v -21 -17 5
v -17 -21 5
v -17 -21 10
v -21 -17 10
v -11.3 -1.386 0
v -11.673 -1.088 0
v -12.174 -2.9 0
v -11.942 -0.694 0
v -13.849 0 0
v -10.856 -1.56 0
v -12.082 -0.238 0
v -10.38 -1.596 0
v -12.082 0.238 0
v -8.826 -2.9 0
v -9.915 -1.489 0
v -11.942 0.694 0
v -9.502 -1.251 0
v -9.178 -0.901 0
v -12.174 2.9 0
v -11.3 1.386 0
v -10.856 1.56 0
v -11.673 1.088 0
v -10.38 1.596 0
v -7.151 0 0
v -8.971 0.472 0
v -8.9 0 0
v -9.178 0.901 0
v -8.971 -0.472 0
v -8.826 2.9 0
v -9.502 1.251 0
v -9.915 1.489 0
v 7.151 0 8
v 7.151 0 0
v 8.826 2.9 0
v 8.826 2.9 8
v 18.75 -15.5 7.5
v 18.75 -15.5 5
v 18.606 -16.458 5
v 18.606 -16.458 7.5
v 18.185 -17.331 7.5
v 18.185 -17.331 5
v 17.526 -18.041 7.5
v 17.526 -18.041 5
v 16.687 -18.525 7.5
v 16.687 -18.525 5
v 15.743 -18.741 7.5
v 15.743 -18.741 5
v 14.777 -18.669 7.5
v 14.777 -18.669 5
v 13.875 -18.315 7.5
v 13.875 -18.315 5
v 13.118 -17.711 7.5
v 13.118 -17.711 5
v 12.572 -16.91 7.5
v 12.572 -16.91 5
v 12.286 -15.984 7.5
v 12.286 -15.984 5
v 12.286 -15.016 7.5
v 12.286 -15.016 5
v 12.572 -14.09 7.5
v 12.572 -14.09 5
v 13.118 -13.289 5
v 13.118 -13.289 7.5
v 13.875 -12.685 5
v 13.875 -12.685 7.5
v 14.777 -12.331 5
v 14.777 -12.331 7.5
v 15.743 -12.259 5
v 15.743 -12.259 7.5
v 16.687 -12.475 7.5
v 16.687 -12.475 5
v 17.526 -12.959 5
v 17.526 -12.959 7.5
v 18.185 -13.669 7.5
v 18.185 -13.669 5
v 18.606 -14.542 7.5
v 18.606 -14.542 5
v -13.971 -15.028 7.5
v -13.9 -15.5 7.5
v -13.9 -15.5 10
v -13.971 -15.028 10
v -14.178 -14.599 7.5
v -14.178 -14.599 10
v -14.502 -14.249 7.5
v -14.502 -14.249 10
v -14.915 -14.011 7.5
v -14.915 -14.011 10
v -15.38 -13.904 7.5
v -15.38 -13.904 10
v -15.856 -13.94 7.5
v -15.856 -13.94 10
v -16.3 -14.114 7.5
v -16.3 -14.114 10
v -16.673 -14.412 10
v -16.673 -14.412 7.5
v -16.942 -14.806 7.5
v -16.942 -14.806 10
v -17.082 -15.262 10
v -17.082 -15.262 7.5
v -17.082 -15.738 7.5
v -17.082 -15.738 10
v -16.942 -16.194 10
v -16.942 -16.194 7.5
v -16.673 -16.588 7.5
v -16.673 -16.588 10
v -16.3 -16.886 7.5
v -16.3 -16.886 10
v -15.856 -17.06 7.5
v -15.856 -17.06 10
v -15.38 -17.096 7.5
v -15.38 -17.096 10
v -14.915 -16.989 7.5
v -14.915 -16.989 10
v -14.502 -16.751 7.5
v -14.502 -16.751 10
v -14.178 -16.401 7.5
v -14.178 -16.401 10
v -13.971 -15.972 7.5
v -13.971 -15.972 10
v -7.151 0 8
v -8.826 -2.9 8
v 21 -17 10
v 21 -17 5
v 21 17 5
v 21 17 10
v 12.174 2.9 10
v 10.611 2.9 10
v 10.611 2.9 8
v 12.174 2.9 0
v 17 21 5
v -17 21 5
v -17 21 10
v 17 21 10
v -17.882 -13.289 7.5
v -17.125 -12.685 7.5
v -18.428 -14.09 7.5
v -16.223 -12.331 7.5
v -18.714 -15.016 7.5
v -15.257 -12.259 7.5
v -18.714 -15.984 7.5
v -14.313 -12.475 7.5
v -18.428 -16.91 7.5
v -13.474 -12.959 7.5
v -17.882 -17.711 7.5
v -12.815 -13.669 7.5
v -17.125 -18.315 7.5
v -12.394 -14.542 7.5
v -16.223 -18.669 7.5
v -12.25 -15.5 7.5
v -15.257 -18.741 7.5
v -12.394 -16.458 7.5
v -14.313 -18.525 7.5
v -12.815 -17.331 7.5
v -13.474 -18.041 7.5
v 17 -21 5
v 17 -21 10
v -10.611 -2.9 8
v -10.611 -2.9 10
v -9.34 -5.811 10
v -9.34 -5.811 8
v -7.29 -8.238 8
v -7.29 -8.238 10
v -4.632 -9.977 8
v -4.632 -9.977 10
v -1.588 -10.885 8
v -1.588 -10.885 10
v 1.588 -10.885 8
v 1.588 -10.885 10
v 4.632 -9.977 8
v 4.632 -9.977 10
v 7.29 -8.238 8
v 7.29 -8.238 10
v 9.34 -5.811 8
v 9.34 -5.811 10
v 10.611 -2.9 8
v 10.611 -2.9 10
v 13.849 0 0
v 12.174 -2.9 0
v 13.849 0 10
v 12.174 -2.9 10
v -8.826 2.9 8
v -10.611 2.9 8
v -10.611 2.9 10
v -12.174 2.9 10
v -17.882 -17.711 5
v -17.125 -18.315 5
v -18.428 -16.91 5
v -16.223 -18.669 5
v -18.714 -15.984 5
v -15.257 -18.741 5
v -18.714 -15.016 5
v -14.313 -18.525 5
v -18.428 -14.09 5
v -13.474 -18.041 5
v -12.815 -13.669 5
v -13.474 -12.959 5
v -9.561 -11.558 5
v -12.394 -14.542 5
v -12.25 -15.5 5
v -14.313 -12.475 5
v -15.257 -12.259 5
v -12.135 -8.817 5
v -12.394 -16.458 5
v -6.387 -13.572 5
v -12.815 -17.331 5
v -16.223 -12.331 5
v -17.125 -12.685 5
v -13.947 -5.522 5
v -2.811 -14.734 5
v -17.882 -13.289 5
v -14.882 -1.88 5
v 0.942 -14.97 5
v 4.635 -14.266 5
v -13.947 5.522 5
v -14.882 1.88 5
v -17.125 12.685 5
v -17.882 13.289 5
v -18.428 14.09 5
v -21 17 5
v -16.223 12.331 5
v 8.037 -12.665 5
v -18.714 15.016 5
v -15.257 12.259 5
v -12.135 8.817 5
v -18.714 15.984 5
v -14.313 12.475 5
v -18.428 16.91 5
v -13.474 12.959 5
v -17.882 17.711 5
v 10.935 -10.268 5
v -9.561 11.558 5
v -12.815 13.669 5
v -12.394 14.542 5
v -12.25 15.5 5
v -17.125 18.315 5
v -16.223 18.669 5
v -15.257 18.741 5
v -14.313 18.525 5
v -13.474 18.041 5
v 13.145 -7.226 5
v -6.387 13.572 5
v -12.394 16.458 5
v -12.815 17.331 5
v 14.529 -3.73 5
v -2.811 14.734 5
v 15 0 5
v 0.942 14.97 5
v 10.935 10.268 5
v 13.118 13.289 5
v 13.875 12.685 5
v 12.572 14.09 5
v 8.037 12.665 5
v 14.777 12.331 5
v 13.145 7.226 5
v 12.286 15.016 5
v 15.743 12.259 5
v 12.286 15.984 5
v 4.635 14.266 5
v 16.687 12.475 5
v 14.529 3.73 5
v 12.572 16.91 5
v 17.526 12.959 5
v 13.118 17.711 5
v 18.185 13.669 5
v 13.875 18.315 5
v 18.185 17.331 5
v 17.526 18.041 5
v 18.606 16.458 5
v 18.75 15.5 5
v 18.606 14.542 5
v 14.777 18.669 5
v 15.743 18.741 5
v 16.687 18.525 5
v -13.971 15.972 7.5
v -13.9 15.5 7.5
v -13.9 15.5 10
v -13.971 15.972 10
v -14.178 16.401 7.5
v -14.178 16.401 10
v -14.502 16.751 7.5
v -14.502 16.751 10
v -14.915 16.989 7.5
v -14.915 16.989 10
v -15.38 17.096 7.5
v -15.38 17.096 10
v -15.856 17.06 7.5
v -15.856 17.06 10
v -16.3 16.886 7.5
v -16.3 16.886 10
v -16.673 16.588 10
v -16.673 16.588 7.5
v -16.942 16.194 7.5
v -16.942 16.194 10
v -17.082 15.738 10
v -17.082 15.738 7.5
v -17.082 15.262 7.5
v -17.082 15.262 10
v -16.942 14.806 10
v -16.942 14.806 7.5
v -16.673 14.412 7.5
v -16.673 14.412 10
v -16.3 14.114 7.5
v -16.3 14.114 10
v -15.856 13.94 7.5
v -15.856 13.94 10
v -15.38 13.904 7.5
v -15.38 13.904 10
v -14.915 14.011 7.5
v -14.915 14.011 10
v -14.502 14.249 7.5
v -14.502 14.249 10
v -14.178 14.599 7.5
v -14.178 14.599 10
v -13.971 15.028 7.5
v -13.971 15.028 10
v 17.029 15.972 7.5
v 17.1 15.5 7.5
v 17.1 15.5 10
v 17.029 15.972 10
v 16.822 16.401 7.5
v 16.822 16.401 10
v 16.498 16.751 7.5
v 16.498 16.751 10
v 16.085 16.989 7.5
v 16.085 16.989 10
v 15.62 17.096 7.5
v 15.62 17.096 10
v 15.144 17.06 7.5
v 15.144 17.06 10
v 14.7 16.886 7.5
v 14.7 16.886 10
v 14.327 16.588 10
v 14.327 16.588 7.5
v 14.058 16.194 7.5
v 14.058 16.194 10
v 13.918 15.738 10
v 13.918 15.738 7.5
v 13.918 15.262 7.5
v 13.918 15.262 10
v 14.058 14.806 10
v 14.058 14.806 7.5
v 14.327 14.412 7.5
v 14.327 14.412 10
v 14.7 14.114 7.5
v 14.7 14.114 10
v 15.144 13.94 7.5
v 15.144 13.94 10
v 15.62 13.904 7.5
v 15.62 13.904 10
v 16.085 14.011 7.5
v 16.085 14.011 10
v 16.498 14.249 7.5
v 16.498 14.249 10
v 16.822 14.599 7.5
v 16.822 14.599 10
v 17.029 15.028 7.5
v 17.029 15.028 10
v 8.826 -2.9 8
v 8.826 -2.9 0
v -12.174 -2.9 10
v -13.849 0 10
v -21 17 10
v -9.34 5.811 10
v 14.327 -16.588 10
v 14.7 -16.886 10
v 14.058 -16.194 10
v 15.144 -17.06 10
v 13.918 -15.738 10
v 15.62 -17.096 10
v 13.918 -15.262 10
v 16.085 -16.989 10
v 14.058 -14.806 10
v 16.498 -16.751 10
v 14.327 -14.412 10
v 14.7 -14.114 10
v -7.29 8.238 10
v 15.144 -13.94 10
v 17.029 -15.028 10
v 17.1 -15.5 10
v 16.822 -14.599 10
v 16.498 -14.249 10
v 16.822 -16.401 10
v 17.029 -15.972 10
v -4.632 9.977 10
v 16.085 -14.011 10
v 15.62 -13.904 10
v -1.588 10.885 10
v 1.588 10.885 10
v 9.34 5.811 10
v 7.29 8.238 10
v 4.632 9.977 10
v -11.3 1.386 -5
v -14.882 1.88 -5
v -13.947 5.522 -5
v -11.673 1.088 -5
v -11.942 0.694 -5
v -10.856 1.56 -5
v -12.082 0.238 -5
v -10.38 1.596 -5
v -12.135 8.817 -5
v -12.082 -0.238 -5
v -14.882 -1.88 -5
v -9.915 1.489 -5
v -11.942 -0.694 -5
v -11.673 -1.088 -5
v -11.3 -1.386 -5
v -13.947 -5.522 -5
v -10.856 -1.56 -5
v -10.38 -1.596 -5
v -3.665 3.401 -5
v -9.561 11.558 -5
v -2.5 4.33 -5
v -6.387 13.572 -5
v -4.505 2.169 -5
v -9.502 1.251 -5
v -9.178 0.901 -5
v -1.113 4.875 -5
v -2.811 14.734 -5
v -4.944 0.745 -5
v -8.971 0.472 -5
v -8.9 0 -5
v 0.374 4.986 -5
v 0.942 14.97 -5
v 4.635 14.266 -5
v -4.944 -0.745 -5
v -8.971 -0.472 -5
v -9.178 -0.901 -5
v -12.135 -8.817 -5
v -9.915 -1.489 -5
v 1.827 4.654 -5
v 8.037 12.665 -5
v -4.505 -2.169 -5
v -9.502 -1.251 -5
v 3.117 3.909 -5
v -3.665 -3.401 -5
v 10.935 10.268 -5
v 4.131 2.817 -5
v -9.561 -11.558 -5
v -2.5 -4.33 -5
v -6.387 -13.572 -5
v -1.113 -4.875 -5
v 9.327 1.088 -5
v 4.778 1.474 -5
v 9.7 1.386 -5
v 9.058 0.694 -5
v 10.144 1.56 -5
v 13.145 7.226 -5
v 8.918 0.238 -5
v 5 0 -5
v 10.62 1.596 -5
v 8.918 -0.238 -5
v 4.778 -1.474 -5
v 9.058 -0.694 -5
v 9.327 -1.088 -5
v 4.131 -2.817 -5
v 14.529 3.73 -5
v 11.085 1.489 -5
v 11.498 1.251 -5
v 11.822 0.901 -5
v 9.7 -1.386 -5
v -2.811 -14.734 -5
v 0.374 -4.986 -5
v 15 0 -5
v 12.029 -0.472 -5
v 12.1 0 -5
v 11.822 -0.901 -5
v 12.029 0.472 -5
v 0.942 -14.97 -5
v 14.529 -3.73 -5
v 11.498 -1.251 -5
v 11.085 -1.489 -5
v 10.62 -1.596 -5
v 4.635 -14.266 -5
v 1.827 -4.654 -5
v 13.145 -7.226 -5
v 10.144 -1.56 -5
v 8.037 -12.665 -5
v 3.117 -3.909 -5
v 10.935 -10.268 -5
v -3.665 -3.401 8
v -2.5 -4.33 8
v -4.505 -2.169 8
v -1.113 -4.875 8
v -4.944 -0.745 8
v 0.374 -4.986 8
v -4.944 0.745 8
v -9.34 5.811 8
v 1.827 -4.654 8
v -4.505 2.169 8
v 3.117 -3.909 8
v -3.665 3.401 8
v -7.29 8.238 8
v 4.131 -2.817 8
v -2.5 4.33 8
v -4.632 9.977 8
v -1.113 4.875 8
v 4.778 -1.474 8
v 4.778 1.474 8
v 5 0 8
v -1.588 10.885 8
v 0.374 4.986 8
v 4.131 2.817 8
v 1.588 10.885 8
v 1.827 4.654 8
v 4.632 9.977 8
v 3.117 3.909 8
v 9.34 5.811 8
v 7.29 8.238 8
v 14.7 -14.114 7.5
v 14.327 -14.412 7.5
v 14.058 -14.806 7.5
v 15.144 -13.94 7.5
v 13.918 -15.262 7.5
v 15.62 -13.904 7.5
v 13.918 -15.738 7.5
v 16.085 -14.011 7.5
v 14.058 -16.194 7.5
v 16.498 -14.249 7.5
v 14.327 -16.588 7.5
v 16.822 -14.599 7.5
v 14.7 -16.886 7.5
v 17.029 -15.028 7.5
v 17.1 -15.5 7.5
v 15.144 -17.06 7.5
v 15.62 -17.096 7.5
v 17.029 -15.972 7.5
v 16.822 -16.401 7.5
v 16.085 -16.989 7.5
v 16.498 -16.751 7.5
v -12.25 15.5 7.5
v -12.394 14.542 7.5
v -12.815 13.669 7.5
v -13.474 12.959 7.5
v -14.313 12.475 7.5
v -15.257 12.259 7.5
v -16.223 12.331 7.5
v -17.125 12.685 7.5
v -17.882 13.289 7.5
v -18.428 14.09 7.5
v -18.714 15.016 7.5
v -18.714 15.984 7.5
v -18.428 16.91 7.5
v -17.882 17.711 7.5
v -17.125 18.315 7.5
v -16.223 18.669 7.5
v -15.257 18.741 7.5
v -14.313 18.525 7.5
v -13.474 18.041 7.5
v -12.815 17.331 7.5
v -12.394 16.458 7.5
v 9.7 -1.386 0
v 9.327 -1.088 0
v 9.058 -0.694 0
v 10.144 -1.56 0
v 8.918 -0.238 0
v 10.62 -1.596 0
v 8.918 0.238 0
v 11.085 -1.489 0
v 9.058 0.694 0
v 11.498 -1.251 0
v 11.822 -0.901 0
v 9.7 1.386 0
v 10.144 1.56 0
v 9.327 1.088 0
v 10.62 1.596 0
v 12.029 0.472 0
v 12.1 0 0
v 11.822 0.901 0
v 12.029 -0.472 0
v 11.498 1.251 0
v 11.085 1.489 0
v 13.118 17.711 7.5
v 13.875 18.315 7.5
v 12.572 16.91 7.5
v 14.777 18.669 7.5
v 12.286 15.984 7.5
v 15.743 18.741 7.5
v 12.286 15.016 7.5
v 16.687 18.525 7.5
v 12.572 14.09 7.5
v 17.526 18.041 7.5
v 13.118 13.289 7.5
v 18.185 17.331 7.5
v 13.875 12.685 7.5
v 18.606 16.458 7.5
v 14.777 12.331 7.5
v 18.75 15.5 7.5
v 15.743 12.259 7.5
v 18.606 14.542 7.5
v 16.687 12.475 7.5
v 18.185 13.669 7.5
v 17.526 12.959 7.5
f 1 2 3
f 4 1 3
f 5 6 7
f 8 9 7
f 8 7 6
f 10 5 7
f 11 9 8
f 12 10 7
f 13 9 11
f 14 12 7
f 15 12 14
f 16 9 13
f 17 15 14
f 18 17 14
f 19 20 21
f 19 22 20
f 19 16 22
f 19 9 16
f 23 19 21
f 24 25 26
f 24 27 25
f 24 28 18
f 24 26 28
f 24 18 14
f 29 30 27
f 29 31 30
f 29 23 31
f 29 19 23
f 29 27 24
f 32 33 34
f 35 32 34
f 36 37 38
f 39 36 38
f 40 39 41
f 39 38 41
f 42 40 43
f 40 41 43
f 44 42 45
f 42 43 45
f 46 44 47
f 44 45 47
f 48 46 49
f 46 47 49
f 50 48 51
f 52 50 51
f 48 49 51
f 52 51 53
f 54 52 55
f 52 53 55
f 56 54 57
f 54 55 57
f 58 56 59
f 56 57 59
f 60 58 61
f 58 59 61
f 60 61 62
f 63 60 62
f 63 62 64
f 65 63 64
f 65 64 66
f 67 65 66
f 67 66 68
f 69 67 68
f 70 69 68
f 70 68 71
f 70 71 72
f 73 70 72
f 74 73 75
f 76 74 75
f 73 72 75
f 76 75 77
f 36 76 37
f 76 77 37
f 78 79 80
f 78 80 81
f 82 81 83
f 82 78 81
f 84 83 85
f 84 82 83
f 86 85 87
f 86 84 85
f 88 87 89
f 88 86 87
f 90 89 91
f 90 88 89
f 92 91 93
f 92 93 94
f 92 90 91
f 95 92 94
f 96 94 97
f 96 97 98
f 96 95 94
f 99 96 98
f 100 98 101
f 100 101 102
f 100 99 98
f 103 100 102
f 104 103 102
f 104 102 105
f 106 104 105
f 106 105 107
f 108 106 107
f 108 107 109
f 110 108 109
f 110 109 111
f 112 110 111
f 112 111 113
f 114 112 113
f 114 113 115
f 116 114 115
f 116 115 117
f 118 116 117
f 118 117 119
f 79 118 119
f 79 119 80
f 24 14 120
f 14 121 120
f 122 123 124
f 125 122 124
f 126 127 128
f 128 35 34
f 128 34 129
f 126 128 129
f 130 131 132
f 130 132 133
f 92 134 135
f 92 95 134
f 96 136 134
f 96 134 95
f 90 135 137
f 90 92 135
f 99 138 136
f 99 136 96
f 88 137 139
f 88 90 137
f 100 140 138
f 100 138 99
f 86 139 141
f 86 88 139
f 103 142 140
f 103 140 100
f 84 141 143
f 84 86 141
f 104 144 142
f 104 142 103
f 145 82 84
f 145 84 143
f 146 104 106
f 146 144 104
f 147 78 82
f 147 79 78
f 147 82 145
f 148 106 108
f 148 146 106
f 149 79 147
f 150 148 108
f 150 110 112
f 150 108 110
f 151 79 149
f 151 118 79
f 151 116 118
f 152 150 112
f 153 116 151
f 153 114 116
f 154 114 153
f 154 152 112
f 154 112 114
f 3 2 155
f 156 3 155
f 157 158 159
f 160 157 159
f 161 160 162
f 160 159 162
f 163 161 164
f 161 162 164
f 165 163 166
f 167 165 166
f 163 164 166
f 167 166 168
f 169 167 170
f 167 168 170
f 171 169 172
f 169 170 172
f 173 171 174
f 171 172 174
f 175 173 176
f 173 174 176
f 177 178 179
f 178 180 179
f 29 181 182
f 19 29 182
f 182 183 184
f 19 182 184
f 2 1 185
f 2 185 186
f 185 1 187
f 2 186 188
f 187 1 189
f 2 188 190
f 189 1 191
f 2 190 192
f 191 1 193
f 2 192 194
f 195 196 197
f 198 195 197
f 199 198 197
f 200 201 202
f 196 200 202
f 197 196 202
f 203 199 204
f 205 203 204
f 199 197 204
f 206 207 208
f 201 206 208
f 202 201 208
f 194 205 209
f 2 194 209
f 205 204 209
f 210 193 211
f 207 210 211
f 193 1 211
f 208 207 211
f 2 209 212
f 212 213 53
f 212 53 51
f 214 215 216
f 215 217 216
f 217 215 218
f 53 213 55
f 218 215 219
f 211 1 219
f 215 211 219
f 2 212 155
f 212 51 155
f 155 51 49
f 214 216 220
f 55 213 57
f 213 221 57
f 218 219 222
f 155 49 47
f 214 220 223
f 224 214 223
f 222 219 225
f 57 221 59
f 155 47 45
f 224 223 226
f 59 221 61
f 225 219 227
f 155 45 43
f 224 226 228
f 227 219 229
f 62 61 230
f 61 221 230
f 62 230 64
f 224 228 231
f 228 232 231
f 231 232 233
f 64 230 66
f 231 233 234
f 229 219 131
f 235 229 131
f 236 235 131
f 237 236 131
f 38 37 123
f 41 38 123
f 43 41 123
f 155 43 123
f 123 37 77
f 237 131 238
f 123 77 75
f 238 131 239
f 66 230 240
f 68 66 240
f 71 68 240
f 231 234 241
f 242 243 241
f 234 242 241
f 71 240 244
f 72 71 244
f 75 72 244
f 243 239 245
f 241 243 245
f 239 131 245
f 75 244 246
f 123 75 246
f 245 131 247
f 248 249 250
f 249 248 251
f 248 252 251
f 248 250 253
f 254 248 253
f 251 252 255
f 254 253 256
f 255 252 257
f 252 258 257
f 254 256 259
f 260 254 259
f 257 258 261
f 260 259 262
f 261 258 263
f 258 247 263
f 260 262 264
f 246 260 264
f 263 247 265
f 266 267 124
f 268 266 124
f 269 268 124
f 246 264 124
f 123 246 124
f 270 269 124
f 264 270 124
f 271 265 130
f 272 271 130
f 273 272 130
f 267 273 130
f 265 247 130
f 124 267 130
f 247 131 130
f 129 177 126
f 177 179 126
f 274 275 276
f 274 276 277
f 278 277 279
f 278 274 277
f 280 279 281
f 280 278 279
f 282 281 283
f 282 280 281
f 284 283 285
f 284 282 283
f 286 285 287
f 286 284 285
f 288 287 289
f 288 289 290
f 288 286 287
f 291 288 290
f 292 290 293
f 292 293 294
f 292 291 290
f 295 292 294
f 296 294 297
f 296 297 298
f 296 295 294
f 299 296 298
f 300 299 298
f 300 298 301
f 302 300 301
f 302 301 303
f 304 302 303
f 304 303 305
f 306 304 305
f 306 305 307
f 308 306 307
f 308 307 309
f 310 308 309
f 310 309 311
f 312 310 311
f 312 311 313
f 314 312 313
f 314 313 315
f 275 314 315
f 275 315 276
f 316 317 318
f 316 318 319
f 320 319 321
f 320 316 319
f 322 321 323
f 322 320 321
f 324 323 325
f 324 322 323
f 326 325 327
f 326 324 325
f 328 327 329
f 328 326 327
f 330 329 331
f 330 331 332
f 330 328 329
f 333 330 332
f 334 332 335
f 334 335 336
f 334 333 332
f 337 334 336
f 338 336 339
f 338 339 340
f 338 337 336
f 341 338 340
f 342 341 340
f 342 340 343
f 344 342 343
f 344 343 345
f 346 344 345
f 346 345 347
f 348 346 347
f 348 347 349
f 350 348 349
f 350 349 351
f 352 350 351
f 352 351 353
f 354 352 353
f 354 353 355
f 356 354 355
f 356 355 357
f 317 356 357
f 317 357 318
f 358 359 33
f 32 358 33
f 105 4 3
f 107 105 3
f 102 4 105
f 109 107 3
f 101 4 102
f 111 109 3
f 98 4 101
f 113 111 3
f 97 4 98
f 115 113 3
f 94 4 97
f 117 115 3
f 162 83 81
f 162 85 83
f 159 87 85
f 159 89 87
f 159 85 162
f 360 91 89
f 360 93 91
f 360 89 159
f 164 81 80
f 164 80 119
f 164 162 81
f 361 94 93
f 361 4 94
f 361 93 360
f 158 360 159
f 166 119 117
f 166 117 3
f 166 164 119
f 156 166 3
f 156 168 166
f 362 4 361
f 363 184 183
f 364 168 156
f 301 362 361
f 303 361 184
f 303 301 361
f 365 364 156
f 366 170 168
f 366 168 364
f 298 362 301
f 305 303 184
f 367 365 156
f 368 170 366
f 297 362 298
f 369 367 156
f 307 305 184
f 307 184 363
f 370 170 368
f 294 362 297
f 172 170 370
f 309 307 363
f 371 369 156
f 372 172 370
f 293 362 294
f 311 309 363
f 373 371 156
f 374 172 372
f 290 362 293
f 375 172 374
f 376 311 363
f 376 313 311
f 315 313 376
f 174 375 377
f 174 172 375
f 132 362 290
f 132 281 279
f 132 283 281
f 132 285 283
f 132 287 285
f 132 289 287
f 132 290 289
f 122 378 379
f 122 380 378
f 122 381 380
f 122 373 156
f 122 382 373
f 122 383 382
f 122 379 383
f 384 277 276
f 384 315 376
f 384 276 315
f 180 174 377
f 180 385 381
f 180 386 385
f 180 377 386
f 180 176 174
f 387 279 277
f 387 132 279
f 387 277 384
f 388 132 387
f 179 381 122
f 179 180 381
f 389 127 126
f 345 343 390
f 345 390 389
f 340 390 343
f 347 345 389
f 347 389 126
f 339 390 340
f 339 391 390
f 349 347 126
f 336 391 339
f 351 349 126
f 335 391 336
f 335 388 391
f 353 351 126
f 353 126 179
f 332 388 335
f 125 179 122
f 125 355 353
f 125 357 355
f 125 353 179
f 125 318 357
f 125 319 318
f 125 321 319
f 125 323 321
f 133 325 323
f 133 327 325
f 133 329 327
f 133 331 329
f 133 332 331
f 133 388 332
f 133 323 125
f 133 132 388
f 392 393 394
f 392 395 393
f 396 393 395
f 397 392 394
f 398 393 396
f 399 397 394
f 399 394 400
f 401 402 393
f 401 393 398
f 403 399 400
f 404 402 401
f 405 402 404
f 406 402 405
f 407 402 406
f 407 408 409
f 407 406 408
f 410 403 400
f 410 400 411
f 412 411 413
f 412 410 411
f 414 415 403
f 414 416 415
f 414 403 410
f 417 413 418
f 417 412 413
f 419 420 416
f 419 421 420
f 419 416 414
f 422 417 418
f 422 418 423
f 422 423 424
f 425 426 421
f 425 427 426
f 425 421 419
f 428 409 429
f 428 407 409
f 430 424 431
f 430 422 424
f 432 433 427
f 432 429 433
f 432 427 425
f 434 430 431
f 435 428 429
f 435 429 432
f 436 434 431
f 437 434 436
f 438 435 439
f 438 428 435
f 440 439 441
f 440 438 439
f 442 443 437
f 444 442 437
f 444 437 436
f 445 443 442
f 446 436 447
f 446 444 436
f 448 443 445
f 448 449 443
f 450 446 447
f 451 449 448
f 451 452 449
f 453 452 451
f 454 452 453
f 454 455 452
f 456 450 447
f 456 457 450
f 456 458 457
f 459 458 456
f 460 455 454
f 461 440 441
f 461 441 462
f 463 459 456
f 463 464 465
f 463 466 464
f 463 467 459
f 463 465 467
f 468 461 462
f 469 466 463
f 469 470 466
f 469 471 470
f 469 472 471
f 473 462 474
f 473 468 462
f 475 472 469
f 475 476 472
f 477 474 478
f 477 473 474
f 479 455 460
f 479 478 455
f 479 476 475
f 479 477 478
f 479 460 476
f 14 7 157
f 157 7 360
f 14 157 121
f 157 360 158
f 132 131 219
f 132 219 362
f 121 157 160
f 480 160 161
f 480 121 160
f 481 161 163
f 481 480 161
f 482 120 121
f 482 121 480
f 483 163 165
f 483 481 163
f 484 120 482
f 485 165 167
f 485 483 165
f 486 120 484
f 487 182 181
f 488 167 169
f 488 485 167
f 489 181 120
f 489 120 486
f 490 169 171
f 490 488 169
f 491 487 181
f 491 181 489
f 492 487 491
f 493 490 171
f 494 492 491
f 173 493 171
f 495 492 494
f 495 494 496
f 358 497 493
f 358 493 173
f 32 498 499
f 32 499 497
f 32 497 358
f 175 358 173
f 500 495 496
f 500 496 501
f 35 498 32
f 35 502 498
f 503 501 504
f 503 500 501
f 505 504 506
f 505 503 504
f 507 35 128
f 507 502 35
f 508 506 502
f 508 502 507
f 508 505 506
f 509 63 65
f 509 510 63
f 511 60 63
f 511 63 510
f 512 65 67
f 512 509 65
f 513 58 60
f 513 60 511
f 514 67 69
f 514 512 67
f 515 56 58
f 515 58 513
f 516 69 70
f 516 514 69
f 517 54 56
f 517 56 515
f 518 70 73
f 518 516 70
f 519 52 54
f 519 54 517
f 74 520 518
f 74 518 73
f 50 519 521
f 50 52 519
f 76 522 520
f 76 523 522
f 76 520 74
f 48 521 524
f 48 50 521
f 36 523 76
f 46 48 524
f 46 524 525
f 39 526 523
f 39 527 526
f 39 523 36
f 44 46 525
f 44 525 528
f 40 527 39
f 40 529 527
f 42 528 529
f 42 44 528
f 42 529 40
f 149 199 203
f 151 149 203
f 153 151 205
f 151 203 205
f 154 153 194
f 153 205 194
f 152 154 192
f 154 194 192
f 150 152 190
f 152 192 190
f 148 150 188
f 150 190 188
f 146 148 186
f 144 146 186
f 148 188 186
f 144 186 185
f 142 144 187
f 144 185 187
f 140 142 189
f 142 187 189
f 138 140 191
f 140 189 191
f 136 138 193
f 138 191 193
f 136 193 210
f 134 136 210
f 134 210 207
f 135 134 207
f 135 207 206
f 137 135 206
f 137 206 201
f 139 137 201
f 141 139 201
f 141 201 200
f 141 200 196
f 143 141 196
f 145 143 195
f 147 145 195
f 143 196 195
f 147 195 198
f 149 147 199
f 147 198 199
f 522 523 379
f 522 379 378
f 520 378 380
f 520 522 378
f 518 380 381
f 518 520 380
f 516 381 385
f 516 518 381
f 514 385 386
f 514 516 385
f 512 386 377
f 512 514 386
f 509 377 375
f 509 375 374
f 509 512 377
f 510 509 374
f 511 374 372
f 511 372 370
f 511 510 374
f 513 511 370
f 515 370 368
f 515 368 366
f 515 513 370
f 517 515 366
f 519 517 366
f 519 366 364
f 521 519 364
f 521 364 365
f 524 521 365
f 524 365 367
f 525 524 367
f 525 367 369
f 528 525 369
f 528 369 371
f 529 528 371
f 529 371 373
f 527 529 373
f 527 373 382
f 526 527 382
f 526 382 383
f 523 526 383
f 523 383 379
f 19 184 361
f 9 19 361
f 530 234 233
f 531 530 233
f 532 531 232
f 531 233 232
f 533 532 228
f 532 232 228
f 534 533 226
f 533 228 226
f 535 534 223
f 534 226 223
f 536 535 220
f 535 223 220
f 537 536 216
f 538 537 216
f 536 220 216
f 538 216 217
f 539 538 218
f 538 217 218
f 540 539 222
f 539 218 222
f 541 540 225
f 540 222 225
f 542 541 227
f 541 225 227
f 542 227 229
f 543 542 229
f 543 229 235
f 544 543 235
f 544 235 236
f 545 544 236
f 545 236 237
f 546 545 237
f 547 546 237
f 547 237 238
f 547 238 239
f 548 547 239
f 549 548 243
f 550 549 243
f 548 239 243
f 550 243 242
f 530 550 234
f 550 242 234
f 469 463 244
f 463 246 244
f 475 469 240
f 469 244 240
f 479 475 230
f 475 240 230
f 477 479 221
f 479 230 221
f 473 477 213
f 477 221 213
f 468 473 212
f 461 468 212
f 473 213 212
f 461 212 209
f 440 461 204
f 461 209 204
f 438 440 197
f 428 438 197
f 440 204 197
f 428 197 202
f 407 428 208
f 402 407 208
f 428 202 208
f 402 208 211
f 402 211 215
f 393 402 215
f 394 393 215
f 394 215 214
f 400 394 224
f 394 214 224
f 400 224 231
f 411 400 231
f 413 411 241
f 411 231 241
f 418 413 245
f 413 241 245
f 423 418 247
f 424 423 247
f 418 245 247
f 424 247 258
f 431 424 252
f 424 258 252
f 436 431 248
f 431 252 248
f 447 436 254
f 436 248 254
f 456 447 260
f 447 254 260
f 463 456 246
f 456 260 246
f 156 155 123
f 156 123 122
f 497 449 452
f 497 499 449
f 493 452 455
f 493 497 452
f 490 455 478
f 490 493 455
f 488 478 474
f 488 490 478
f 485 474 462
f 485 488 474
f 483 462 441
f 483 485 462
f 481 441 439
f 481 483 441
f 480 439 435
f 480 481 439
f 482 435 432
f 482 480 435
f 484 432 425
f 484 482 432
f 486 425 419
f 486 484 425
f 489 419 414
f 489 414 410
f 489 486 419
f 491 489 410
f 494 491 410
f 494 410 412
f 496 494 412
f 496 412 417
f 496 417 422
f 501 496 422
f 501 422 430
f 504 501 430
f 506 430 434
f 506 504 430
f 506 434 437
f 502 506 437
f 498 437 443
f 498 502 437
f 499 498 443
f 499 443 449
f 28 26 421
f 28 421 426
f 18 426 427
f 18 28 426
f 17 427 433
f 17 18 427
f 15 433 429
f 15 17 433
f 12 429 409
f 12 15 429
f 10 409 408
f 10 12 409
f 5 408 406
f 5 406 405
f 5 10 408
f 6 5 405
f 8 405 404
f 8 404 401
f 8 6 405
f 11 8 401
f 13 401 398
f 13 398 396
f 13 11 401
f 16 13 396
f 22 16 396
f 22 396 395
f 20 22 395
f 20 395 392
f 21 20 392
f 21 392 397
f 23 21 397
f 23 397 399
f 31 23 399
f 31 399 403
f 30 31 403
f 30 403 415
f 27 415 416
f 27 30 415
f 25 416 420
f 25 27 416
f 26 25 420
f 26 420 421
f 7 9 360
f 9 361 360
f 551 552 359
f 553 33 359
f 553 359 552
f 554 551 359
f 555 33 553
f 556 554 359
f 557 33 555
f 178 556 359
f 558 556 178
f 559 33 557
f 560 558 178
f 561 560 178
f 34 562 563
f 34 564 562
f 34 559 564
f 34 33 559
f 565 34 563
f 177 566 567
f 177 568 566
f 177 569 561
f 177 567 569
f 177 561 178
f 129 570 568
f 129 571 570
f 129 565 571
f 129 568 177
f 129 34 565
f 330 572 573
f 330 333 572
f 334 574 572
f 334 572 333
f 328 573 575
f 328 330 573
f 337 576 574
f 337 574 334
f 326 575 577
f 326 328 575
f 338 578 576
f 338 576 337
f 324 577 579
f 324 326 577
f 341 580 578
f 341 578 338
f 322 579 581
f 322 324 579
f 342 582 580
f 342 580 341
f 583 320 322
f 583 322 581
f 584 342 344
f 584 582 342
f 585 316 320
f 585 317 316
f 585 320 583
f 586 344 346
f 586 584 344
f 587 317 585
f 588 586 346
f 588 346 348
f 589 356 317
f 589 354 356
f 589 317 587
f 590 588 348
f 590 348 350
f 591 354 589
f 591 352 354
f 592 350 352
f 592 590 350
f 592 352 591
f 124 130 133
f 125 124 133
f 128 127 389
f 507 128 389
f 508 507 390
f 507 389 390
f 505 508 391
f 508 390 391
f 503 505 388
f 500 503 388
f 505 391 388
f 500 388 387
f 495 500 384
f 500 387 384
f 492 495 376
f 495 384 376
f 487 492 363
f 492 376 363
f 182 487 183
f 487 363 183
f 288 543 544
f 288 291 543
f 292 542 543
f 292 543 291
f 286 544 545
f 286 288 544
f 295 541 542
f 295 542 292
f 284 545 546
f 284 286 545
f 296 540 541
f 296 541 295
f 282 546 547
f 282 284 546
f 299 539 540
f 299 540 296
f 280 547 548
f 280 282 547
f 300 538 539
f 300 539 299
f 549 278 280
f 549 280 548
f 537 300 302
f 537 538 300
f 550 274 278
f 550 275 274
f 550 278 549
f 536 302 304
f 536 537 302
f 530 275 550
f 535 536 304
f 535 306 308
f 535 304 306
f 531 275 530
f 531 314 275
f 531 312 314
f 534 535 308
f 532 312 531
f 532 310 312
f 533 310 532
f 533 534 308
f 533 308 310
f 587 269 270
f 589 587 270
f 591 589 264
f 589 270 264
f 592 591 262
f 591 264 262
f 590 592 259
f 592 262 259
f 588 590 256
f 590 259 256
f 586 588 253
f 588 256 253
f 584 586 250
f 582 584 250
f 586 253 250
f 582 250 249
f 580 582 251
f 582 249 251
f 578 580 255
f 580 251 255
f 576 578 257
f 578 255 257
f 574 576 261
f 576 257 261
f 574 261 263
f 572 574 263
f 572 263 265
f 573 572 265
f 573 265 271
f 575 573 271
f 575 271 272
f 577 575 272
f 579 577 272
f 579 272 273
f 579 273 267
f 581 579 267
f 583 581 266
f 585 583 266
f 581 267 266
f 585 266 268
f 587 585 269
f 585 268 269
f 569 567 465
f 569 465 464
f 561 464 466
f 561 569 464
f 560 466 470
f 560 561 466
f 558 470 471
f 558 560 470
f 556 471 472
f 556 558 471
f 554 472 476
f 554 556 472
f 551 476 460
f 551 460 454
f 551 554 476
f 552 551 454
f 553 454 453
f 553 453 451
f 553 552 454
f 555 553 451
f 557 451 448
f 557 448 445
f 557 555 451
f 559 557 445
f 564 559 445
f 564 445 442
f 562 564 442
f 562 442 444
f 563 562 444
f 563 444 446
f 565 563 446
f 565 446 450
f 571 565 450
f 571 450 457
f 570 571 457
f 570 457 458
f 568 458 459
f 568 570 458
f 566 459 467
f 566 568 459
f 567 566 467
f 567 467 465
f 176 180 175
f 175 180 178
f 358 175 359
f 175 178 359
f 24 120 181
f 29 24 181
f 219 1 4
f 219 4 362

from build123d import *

# Parameters (mm, degrees)
F0_R      = 15
F0_R_2    = 1.6
F0_R_3    = 5
F1_DEPTH  = 5
F2_W      = 42
F2_H      = 42
F2_R      = 1.6
F2_R_2    = 15
F2_R_3    = 5
F3_DEPTH  = 5
F4_SIZE   = 4
F5_R      = 5
F6_DEPTH  = 2
F7_R      = 15
F7_R_2    = 1.6
F7_R_3    = 5
F8_DEPTH  = 5
F9_R      = 1.6
F10_DEPTH = 5
F11_R     = 3.25
F11_R_2   = 1.6
F12_DEPTH = 2.5


with BuildPart() as f1:
    # F0 (on Top) → F1 (new body)
    with BuildSketch(Plane.XY):
        Circle(F0_R)
        with Locations((-10.5, 0)):
            Circle(F0_R_2, mode=Mode.SUBTRACT)
        Circle(F0_R_3, mode=Mode.SUBTRACT)
        with Locations((10.5, 0)):
            Circle(F0_R_2, mode=Mode.SUBTRACT)
    extrude(amount=F1_DEPTH)

    # F2 (on face) → F3 (join)
    with BuildSketch(Plane.XY.offset(5)):
        Rectangle(F2_W, F2_H)
        with Locations((-15.5, -15.5)):
            Circle(F2_R, mode=Mode.SUBTRACT)
        with Locations((15.5, -15.5)):
            Circle(F2_R, mode=Mode.SUBTRACT)
        with Locations((-15.5, 15.5)):
            Circle(F2_R, mode=Mode.SUBTRACT)
        Circle(F2_R_2, mode=Mode.SUBTRACT)
        with Locations((15.5, 15.5)):
            Circle(F2_R, mode=Mode.SUBTRACT)
        Circle(F2_R_2)
        Polygon((-13.8486315613, 0), (-12.1743157806, 2.9), (-8.8256842194, 2.9), (-7.1513684387, 0), (-8.8256842194, -2.9), (-12.1743157806, -2.9), align=None, mode=Mode.SUBTRACT)
        Circle(F2_R_3, mode=Mode.SUBTRACT)
        Polygon((13.8486315613, 0), (12.1743157806, -2.9), (8.8256842194, -2.9), (7.1513684387, 0), (8.8256842194, 2.9), (12.1743157806, 2.9), align=None, mode=Mode.SUBTRACT)
    extrude(amount=F3_DEPTH)

    # F4
    f4_edges = [f1.edges().sort_by_distance(p)[0] for p in [
        (21, 21, 7.5),
        (21, -21, 7.5),
        (-21, -21, 7.5),
        (-21, 21, 7.5),
    ]]
    chamfer(f4_edges, length=F4_SIZE)

    # F5 (on face) → F6 (cut)
    with BuildSketch(Plane.XY.offset(10)):
        with BuildLine():
            Line((8.8256842194, 2.9), (10.6108435103, 2.9))
            ThreePointArc((10.6108435103, 2.9), (0, 11), (-10.6108435103, 2.9))
            Line((-10.6108435103, 2.9), (-8.8256842194, 2.9))
            Line((-8.8256842194, 2.9), (-7.1513684387, 0))
            Line((-7.1513684387, 0), (-8.8256842194, -2.9))
            Line((-8.8256842194, -2.9), (-10.6108435103, -2.9))
            ThreePointArc((-10.6108435103, -2.9), (0, -11), (10.6108435103, -2.9))
            Line((10.6108435103, -2.9), (8.8256842194, -2.9))
            Line((8.8256842194, -2.9), (7.1513684387, 0))
            Line((7.1513684387, 0), (8.8256842194, 2.9))
        make_face()
        Circle(F5_R, mode=Mode.SUBTRACT)
    extrude(amount=-F6_DEPTH, mode=Mode.SUBTRACT)

    # F7 (on face) → F8 (join)
    with BuildSketch(Plane(origin=(0, 0, 0), x_dir=(1, 0, 0), z_dir=(0, 0, -1))):
        Circle(F7_R)
        with Locations((-10.5, 0)):
            Circle(F7_R_2, mode=Mode.SUBTRACT)
        Circle(F7_R_3, mode=Mode.SUBTRACT)
        with Locations((10.5, 0)):
            Circle(F7_R_2, mode=Mode.SUBTRACT)
    extrude(amount=F8_DEPTH)

    # F9 (on face) → F10 (cut)
    with BuildSketch(Plane.XY.offset(5)):
        Polygon((-12.1743157806, 2.9), (-13.8486315613, 0), (-12.1743157806, -2.9), (-8.8256842194, -2.9), (-7.1513684387, 0), (-8.8256842194, 2.9), align=None)
        with Locations((-10.5, 0)):
            Circle(F9_R, mode=Mode.SUBTRACT)
        Polygon((8.8256842194, -2.9), (12.1743157806, -2.9), (13.8486315613, 0), (12.1743157806, 2.9), (8.8256842194, 2.9), (7.1513684387, 0), align=None)
    extrude(amount=-F10_DEPTH, mode=Mode.SUBTRACT)

    # F11 (on face) → F12 (cut)
    with BuildSketch(Plane(origin=(0, 0, 5), x_dir=(1, 0, 0), z_dir=(0, 0, -1))):
        with Locations((15.5, 15.5)):
            Circle(F11_R)
        with Locations((15.5, 15.5)):
            Circle(F11_R_2, mode=Mode.SUBTRACT)
        with Locations((15.5, -15.5)):
            Circle(F11_R)
        with Locations((15.5, -15.5)):
            Circle(F11_R_2, mode=Mode.SUBTRACT)
        with Locations((-15.5, -15.5)):
            Circle(F11_R)
        with Locations((-15.5, -15.5)):
            Circle(F11_R_2, mode=Mode.SUBTRACT)
        with Locations((-15.5, 15.5)):
            Circle(F11_R)
        with Locations((-15.5, 15.5)):
            Circle(F11_R_2, mode=Mode.SUBTRACT)
    extrude(amount=-F12_DEPTH, mode=Mode.SUBTRACT)


solid = f1.part
